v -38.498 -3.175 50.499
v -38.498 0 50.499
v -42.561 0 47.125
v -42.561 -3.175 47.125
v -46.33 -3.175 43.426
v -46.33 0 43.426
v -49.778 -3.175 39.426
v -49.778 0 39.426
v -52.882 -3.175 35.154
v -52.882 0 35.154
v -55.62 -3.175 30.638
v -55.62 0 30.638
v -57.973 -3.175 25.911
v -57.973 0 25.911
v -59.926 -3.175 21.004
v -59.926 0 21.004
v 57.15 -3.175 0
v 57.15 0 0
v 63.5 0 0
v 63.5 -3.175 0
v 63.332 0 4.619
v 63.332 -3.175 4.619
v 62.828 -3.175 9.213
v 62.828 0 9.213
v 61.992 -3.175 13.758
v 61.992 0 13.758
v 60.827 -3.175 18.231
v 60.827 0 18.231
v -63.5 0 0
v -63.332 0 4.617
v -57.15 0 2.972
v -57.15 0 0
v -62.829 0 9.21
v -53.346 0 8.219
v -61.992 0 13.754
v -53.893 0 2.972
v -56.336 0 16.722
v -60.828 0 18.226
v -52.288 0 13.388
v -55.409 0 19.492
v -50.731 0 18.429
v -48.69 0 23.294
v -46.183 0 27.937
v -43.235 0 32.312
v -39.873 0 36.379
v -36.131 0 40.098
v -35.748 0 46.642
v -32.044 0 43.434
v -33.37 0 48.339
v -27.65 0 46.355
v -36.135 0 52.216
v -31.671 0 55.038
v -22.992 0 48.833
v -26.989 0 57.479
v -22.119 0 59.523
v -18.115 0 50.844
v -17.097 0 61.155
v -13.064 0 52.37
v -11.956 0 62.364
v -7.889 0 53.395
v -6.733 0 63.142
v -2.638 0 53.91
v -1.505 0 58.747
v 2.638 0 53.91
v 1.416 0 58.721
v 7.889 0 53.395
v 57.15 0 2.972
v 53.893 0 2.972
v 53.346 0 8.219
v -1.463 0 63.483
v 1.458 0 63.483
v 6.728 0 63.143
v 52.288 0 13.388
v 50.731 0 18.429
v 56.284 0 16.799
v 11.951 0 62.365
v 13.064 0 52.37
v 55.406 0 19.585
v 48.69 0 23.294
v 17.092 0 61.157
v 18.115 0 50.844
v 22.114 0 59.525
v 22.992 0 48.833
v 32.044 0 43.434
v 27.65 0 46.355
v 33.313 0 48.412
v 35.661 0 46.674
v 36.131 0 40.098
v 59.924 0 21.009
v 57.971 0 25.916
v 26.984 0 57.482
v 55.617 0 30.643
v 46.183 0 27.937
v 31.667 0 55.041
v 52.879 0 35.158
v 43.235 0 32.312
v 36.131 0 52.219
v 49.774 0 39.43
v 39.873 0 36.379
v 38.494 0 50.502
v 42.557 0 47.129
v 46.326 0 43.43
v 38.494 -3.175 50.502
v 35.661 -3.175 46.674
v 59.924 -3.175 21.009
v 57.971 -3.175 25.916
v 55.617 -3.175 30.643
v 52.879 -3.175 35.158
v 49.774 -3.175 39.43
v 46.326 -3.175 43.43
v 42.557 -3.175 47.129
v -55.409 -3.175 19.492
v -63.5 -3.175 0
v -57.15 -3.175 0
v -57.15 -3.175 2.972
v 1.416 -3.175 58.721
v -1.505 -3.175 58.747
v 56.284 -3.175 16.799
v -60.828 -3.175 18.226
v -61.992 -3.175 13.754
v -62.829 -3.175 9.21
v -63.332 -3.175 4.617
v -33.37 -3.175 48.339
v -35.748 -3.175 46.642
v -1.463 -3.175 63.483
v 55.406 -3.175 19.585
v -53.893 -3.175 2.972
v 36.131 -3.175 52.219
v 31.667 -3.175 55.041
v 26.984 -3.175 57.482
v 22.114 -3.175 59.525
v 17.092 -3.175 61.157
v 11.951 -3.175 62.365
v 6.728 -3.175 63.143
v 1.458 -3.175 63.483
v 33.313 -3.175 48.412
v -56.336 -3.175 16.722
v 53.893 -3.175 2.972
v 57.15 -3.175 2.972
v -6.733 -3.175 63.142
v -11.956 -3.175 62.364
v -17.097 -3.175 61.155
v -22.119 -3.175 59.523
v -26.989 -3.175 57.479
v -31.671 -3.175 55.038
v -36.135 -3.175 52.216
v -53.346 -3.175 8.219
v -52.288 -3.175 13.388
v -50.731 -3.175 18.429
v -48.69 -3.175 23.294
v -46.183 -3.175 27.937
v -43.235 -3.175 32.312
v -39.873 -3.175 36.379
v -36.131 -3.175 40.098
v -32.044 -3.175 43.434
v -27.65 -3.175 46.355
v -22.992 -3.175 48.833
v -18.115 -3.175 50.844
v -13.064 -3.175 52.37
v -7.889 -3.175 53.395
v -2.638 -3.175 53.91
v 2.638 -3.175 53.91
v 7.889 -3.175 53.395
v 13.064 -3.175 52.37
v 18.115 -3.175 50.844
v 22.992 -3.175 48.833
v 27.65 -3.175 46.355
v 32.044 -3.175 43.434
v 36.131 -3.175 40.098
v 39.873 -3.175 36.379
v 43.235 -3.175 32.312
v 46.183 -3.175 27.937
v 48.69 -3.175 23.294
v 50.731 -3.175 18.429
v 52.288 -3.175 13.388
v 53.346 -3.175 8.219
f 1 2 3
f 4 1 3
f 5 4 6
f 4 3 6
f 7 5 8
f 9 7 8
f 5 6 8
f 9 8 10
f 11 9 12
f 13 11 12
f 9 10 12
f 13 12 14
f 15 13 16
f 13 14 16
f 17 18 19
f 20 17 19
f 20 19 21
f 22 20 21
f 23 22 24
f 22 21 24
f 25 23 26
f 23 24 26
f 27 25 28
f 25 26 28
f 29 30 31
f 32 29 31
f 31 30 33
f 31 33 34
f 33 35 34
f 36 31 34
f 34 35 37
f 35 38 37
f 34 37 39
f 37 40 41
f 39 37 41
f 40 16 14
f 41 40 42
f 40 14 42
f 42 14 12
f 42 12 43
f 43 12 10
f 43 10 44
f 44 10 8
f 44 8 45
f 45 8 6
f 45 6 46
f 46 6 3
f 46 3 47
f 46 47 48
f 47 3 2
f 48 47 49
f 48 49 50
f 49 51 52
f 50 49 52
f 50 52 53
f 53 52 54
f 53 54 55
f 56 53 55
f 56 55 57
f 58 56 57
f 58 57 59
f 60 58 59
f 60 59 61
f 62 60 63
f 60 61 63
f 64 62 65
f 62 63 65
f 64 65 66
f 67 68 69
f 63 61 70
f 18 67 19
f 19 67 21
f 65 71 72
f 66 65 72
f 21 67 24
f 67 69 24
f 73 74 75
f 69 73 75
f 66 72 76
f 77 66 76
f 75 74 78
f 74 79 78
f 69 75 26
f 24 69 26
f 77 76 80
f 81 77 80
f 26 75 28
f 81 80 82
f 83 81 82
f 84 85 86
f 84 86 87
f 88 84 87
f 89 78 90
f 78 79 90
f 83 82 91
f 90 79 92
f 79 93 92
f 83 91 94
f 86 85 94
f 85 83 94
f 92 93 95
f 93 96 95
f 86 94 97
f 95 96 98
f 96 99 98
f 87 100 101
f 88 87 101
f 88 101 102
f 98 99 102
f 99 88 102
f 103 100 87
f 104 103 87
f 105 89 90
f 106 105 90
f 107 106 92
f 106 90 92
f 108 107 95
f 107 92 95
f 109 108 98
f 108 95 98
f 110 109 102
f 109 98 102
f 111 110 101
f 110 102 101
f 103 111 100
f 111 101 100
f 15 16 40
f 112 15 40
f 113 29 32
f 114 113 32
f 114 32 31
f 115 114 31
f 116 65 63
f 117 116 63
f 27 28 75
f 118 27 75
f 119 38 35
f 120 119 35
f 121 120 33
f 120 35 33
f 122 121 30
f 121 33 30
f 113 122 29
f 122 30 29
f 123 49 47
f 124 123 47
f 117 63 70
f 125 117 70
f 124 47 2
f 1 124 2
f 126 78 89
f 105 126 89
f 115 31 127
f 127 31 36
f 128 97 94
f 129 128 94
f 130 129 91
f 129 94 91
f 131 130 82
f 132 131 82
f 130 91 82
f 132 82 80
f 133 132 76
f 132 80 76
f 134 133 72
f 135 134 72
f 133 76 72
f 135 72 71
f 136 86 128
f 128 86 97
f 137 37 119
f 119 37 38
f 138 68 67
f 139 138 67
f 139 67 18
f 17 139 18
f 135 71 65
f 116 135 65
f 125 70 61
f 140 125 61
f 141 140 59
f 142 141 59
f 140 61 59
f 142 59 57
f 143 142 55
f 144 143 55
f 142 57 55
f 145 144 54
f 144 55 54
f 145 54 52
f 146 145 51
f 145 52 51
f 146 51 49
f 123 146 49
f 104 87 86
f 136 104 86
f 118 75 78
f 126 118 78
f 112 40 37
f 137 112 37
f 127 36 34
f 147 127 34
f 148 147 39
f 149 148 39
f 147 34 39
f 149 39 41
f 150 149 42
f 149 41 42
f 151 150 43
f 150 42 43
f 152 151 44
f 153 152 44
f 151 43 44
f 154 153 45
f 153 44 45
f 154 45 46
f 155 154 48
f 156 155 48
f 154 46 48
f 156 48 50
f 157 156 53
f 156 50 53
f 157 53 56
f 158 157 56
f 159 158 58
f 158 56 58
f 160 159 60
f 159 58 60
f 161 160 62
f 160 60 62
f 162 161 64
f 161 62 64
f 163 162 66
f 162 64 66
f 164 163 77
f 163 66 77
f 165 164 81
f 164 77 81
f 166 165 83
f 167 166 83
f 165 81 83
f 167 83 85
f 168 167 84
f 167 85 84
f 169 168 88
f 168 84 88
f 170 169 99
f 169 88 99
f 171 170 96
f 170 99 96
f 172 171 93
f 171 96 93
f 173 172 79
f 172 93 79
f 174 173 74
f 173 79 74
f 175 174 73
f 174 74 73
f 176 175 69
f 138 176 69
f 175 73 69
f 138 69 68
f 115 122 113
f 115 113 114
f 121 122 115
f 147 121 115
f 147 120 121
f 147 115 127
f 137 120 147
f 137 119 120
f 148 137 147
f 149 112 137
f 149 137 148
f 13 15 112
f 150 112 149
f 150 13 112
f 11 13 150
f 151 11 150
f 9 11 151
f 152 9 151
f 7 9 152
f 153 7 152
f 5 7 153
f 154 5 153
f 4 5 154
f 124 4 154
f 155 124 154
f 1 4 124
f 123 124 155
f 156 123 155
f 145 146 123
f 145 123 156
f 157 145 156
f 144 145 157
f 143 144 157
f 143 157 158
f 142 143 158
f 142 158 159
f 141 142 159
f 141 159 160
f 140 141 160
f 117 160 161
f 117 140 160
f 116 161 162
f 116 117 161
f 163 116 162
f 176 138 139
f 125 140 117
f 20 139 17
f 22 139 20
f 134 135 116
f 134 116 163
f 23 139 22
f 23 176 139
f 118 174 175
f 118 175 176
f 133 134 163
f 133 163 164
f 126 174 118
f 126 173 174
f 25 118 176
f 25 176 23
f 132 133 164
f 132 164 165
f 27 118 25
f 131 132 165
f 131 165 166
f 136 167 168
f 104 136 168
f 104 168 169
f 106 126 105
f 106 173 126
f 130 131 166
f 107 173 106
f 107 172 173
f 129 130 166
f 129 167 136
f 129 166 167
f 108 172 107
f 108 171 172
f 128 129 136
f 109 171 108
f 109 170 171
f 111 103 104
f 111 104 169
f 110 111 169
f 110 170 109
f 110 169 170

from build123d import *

# Parameters (mm, degrees)
F1_DEPTH = 3.175


with BuildPart() as f1:
    # F0 (on Front) → F1 (new body)
    with BuildSketch(Plane.XZ):
        with BuildLine():
            Line((57.15, 0), (63.5, 0))
            ThreePointArc((63.5, 0), (62.82811, 9.21296), (60.826657, 18.230956))
            Line((60.826657, 18.230956), (56.284487, 16.799141))
            Line((56.284487, 16.799141), (55.406307, 19.585005))
            Line((55.406307, 19.585005), (59.923863, 21.009061))
            ThreePointArc((59.923863, 21.009061), (51.370959, 37.326593), (38.493912, 50.502165))
            Line((38.493912, 50.502165), (35.660819, 46.673982))
            Line((35.660819, 46.673982), (33.312867, 48.411612))
            Line((33.312867, 48.411612), (36.130607, 52.219051))
            ThreePointArc((36.130607, 52.219051), (19.619958, 60.392941), (1.457801, 63.483264))
            Line((1.457801, 63.483264), (1.415931, 58.720948))
            Line((1.415931, 58.720948), (-1.504956, 58.746629))
            Line((-1.504956, 58.746629), (-1.463313, 63.483137))
            ThreePointArc((-1.463313, 63.483137), (-19.625201, 60.391237), (-36.13514, 52.215914))
            Line((-36.13514, 52.215914), (-33.369795, 48.338508))
            Line((-33.369795, 48.338508), (-35.747937, 46.64243))
            Line((-35.747937, 46.64243), (-38.498297, 50.498823))
            ThreePointArc((-38.498297, 50.498823), (-51.374199, 37.322134), (-59.925687, 21.003859))
            Line((-59.925687, 21.003859), (-55.409394, 19.492401))
            Line((-55.409394, 19.492401), (-56.336421, 16.722408))
            Line((-56.336421, 16.722408), (-60.82824, 18.225675))
            ThreePointArc((-60.82824, 18.225675), (-62.82851, 9.210233), (-63.5, 0))
            Line((-63.5, 0), (-57.15, 0))
            Line((-57.15, 0), (-57.15, 2.9718))
            Line((-57.15, 2.9718), (-53.893126, 2.9718))
            ThreePointArc((-53.893126, 2.9718), (0, 53.975), (53.893126, 2.9718))
            Line((53.893126, 2.9718), (53.975, 2.9718))
            Line((53.975, 2.9718), (57.15, 2.9718))
            Line((57.15, 2.9718), (57.15, 0))
        make_face()
    extrude(amount=F1_DEPTH)


solid = f1.part
